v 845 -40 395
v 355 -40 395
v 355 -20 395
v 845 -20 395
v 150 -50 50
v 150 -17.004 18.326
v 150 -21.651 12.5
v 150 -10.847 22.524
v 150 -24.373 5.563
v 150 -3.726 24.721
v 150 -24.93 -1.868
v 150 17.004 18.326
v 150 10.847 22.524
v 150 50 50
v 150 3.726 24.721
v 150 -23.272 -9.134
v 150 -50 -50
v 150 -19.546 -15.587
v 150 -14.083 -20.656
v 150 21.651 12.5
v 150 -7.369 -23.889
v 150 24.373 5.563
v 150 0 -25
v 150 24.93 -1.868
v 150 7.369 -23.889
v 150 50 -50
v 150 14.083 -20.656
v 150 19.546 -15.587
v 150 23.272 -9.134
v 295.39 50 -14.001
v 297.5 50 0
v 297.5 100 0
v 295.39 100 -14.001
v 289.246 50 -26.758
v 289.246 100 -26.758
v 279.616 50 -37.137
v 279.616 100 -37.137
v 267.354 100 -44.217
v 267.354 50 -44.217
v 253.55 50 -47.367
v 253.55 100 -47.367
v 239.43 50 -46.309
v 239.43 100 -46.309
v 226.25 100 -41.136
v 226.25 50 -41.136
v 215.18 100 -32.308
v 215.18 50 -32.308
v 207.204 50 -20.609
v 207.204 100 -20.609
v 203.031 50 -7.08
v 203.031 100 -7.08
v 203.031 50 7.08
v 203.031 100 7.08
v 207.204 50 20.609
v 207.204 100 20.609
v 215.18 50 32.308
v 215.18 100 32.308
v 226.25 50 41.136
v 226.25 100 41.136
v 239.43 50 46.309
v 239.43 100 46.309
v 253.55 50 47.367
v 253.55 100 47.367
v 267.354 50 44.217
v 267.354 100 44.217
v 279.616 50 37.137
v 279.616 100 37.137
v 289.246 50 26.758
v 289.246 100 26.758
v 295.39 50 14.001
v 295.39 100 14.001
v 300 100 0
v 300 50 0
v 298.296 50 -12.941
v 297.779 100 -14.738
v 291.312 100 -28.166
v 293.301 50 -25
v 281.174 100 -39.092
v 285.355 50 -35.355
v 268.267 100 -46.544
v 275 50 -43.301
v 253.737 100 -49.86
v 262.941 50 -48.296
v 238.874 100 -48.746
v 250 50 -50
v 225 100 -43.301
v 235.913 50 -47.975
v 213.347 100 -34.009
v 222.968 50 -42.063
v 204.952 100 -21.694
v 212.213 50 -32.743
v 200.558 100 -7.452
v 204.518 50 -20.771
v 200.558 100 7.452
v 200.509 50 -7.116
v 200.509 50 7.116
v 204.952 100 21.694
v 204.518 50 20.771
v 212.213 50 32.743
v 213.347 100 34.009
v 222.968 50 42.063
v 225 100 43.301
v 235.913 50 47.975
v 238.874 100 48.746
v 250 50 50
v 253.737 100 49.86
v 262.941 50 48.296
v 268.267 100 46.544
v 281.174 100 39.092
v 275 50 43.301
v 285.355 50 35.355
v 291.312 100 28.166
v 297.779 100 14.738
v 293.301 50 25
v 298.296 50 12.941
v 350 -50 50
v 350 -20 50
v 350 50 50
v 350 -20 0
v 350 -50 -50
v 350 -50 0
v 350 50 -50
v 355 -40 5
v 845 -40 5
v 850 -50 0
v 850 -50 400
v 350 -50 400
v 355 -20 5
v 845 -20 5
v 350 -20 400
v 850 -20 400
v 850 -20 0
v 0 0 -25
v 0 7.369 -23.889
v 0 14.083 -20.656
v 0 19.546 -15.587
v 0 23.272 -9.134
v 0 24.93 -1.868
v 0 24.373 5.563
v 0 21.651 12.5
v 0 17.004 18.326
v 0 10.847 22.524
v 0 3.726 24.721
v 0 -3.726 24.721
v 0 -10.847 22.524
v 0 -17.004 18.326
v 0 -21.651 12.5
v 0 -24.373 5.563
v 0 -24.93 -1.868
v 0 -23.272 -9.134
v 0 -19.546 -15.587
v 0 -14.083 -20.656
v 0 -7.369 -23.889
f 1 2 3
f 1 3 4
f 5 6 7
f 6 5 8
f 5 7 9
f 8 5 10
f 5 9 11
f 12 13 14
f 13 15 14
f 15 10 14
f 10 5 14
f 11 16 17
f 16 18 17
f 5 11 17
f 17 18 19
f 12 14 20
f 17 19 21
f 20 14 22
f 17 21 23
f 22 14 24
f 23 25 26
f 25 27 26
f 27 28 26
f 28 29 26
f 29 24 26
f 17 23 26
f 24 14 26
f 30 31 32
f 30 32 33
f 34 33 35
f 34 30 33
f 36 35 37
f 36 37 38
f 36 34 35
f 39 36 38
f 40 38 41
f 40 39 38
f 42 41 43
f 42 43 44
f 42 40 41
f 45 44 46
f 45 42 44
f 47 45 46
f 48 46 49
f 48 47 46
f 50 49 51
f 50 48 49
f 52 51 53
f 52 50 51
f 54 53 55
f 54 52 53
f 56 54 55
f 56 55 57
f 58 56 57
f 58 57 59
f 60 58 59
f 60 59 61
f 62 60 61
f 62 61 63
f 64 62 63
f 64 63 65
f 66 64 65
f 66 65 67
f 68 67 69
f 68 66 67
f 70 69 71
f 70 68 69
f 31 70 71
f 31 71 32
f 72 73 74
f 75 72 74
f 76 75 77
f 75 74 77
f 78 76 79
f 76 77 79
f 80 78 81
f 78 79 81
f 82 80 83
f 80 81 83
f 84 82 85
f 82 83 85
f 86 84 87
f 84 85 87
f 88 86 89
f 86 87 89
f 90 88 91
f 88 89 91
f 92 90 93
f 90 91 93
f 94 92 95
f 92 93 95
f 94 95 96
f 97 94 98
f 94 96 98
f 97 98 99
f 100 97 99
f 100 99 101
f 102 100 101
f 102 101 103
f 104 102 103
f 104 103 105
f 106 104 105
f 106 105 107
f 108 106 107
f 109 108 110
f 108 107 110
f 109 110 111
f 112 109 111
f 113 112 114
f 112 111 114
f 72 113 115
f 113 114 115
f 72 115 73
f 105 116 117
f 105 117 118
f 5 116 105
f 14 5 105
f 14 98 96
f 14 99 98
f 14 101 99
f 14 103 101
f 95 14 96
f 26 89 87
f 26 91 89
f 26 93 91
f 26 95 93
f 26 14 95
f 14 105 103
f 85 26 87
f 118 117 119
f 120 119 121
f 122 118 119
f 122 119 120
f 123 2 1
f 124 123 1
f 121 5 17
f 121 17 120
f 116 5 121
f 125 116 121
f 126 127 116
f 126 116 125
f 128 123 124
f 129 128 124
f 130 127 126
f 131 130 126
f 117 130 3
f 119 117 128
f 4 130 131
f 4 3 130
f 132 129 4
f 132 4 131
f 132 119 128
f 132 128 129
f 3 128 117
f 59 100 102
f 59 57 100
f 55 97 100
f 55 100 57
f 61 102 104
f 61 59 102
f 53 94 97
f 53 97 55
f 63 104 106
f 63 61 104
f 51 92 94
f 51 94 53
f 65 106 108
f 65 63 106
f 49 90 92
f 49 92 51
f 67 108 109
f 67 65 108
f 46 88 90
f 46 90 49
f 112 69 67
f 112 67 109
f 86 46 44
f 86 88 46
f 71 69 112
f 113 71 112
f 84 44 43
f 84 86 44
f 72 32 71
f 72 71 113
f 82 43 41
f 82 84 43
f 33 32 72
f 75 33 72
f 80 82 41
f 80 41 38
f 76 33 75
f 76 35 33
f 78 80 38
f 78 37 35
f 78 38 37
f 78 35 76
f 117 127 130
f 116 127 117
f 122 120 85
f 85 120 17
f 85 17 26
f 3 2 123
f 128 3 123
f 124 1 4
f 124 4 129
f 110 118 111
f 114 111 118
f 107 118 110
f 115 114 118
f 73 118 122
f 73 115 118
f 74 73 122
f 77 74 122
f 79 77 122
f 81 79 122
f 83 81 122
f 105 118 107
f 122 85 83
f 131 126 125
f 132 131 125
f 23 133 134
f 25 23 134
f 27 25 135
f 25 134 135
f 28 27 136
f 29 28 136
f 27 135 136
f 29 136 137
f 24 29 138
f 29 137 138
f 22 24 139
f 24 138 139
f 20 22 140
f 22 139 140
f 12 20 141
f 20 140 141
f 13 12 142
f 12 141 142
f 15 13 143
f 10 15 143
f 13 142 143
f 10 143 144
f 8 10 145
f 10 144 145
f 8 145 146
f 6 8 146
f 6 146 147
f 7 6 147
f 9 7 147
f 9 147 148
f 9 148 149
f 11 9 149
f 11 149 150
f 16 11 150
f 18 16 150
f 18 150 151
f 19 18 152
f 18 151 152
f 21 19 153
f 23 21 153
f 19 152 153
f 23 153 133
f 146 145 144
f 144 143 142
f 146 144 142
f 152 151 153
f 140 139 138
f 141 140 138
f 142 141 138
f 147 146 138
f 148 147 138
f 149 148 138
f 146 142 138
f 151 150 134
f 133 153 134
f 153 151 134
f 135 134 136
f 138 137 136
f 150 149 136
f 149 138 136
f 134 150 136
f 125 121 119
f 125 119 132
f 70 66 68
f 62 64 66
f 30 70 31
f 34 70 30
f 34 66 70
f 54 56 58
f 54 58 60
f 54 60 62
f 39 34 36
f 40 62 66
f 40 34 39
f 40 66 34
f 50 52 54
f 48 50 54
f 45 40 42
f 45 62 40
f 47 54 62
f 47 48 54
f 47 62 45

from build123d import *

# Parameters (mm, degrees)
SKETCH1_R           = 25
BOSS_EXTRUDE1_DEPTH = 150
SKETCH2_W           = 100
SKETCH2_H           = 100
BOSS_EXTRUDE2_DEPTH = 200
SKETCH3_R           = 50
SKETCH3_R_2         = 47.5
BOSS_EXTRUDE3_DEPTH = 50
SKETCH4_W           = 500
SKETCH4_H           = 400
SKETCH4_W_2         = 490
SKETCH4_H_2         = 390
BOSS_EXTRUDE4_DEPTH = 30
SKETCH5_W           = 490
SKETCH5_H           = 390
BOSS_EXTRUDE5_DEPTH = 10


with BuildPart() as part:
    # Sketch1 → Boss-Extrude1 (new body)
    with BuildSketch(Plane(origin=(0, 0, 0), x_dir=(0, 0, -1), z_dir=(1, 0, 0))):
        Circle(SKETCH1_R)
    extrude(amount=BOSS_EXTRUDE1_DEPTH)

    # Sketch2 → Boss-Extrude2 (add)
    with BuildSketch(Plane(origin=(150, 0, 0), x_dir=(0, 0, -1), z_dir=(1, 0, 0))):
        Rectangle(SKETCH2_W, SKETCH2_H)
    extrude(amount=BOSS_EXTRUDE2_DEPTH)

    # Sketch3 → Boss-Extrude3 (add)
    with BuildSketch(Plane(origin=(0, 50, 0), x_dir=(1, 0, 0), z_dir=(0, 1, 0))):
        with Locations((250, 0)):
            Circle(SKETCH3_R)
        with Locations((250, 0)):
            Circle(SKETCH3_R_2, mode=Mode.SUBTRACT)
    extrude(amount=BOSS_EXTRUDE3_DEPTH)

    # Sketch4 → Boss-Extrude4 (add)
    with BuildSketch(Plane(origin=(0, -50, 0), x_dir=(1, 0, 0), z_dir=(0, 1, 0))):
        with Locations((600, -200)):
            Rectangle(SKETCH4_W, SKETCH4_H)
        with Locations((600, -200)):
            Rectangle(SKETCH4_W_2, SKETCH4_H_2, mode=Mode.SUBTRACT)
    extrude(amount=BOSS_EXTRUDE4_DEPTH)

    # Sketch5 → Boss-Extrude5 (add)
    with BuildSketch(Plane.XZ.offset(50)):
        with Locations((600, 200)):
            Rectangle(SKETCH5_W, SKETCH5_H)
    extrude(amount=-BOSS_EXTRUDE5_DEPTH)


solid = part.part
